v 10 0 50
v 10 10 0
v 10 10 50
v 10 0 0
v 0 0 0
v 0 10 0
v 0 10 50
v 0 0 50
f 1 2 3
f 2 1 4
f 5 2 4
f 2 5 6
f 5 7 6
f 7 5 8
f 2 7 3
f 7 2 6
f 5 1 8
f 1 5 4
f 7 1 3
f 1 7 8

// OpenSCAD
difference() {
  cube([10, 10, 700]);
  translate([0, 0, 50]) cube([10, 10, 700]);
  translate([0, 0, 100]) cube([10, 10, 700]);
  translate([0, 0, 150]) cube([10, 10, 700]);
  translate([0, 0, 200]) cube([10, 10, 700]);
  translate([0, 0, 250]) cube([10, 10, 700]);
  translate([0, 0, 300]) cube([10, 10, 700]);
  translate([0, 0, 350]) cube([10, 10, 700]);
  translate([0, 0, 400]) cube([10, 10, 700]);
  translate([0, 0, 450]) cube([10, 10, 700]);
  translate([0, 0, 500]) cube([10, 10, 700]);
  translate([0, 0, 550]) cube([10, 10, 700]);
  translate([0, 0, 600]) cube([10, 10, 700]);
  translate([0, 0, 650]) cube([10, 10, 700]);
}
